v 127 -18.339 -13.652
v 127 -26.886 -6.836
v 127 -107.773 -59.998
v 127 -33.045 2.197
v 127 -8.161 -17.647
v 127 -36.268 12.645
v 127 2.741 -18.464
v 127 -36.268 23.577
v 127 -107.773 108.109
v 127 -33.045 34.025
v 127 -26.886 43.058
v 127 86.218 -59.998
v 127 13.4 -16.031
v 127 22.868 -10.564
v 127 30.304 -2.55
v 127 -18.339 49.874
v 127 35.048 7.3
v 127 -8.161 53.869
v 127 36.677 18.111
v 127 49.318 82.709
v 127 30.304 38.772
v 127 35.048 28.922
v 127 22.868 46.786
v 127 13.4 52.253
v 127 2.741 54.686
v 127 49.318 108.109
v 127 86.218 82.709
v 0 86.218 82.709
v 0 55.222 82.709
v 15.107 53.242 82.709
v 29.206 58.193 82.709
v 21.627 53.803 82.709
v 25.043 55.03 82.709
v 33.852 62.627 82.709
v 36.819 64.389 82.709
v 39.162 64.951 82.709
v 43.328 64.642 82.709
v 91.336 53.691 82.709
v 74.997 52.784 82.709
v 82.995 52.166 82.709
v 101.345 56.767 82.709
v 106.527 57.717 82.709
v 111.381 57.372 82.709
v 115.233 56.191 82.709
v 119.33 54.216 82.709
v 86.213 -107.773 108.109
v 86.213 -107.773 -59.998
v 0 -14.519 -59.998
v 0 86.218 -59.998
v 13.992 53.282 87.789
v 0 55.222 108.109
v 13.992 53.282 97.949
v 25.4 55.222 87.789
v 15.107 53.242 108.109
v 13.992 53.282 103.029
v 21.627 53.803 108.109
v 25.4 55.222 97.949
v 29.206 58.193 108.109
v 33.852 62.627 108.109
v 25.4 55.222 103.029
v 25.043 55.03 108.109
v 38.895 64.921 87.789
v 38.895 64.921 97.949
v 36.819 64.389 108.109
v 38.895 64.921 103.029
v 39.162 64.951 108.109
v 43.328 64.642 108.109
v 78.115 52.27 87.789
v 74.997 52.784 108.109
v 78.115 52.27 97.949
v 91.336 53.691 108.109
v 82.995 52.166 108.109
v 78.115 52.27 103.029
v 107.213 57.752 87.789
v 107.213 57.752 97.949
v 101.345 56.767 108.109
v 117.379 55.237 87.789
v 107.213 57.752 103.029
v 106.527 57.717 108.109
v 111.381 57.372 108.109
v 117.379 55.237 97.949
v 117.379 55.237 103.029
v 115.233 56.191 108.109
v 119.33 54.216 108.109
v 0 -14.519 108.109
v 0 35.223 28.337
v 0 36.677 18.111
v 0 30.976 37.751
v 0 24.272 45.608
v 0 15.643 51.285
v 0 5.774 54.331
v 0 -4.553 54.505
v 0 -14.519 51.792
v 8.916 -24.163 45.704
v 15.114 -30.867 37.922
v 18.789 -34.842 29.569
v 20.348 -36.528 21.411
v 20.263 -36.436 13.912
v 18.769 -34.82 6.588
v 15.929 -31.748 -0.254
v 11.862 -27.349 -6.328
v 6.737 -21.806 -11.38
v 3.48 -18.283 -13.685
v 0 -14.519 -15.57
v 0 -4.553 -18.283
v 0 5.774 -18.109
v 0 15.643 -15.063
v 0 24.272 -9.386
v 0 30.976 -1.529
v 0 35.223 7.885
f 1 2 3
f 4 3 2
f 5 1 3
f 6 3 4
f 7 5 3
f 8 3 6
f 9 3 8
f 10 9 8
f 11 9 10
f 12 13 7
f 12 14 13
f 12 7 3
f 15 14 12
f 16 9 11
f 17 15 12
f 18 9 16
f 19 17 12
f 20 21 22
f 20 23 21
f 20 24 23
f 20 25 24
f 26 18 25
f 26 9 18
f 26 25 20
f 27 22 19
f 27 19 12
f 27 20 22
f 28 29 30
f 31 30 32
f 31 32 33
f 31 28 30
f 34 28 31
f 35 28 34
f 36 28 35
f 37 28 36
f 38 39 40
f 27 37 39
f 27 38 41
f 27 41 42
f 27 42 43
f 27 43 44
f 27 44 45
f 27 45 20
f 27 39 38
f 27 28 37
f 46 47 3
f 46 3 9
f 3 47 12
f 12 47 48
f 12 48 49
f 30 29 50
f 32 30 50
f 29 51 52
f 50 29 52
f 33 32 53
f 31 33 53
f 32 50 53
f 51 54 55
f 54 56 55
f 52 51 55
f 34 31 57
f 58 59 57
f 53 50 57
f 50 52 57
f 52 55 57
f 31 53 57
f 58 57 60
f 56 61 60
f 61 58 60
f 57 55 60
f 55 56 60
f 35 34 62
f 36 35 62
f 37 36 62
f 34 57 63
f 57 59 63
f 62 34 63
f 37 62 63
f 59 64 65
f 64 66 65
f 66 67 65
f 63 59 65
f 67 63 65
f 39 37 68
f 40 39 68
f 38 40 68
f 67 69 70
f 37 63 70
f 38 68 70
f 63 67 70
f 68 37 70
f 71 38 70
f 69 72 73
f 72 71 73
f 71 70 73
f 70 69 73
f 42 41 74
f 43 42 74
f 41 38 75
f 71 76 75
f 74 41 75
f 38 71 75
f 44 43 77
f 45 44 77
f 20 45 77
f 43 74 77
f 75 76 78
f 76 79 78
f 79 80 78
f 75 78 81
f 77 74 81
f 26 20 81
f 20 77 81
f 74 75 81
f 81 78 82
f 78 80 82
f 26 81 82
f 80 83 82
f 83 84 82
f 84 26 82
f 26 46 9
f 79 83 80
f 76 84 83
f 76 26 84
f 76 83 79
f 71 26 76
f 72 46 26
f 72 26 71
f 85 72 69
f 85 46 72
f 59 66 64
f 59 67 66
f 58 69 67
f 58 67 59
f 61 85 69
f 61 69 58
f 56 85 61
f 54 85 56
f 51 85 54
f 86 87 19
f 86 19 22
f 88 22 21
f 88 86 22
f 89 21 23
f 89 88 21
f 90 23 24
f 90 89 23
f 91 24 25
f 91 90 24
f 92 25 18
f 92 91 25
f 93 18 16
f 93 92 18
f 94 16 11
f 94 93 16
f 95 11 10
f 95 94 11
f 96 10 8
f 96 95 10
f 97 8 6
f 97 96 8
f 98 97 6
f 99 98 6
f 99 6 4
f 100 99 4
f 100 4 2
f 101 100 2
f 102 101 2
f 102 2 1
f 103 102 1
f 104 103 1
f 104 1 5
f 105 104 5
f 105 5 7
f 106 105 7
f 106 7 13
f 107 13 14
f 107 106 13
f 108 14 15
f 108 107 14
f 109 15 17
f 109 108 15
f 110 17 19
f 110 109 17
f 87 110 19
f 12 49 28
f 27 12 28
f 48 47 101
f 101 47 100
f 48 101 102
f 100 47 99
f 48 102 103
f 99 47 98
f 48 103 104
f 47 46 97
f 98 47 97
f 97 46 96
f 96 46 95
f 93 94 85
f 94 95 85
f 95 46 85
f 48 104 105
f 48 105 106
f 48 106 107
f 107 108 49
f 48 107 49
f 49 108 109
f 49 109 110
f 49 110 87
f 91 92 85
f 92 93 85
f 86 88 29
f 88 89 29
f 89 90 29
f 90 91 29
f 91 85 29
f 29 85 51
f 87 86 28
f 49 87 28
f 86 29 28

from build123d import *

# Parameters (mm, degrees)
F0_W     = 193.9907595515
F0_H     = 168.106880039
F0_R     = 36.6772862691
F1_DEPTH = 127
F3_DEPTH = 25.4
F5_DEPTH = 168.106880039


with BuildPart() as f1:
    # F0 (on Right) → F1 (new body)
    with BuildSketch(Plane.YZ):
        with Locations((-10.7772685587, 24.0554083139)):
            Rectangle(F0_W, F0_H)
        with Locations((0, 18.1110166013)):
            Circle(F0_R, mode=Mode.SUBTRACT)
    extrude(amount=F1_DEPTH)

    # F2 (on face) → F3 (cut)
    with BuildSketch(Plane.XY.offset(108.1088483334)):
        with BuildLine():
            Line((0, 86.218111217), (0, 55.2217625082))
            add(Edge.make_bspline(
                [(0, 55.2217625082), (9.6147210988, 53.4978525461), (27.0066613183, 50.3794949053), (37.4402038298, 73.9035979944), (78.6246433045, 43.3299400269), (106.8380515, 63.040830288), (120.6463905868, 53.6422520116), (127, 49.3176989257)],
                knots=[0, 0, 0, 0, 0.1967507704, 0.3558998333, 0.6065111476, 0.8189445913, 1, 1, 1, 1], degree=3))
            Line((127, 49.3176989257), (127, 86.218111217))
            Line((127, 86.218111217), (0, 86.218111217))
        make_face()
    extrude(amount=-F3_DEPTH, mode=Mode.SUBTRACT)

    # F4 (on face) → F5 (cut, through all)
    with BuildSketch(Plane.XY.offset(108.1088483334)):
        Polygon((86.2131866927, -107.7726483345), (0, -14.5187666979), (0, -107.7726483345), align=None)
    extrude(amount=-F5_DEPTH, mode=Mode.SUBTRACT)


solid = f1.part
